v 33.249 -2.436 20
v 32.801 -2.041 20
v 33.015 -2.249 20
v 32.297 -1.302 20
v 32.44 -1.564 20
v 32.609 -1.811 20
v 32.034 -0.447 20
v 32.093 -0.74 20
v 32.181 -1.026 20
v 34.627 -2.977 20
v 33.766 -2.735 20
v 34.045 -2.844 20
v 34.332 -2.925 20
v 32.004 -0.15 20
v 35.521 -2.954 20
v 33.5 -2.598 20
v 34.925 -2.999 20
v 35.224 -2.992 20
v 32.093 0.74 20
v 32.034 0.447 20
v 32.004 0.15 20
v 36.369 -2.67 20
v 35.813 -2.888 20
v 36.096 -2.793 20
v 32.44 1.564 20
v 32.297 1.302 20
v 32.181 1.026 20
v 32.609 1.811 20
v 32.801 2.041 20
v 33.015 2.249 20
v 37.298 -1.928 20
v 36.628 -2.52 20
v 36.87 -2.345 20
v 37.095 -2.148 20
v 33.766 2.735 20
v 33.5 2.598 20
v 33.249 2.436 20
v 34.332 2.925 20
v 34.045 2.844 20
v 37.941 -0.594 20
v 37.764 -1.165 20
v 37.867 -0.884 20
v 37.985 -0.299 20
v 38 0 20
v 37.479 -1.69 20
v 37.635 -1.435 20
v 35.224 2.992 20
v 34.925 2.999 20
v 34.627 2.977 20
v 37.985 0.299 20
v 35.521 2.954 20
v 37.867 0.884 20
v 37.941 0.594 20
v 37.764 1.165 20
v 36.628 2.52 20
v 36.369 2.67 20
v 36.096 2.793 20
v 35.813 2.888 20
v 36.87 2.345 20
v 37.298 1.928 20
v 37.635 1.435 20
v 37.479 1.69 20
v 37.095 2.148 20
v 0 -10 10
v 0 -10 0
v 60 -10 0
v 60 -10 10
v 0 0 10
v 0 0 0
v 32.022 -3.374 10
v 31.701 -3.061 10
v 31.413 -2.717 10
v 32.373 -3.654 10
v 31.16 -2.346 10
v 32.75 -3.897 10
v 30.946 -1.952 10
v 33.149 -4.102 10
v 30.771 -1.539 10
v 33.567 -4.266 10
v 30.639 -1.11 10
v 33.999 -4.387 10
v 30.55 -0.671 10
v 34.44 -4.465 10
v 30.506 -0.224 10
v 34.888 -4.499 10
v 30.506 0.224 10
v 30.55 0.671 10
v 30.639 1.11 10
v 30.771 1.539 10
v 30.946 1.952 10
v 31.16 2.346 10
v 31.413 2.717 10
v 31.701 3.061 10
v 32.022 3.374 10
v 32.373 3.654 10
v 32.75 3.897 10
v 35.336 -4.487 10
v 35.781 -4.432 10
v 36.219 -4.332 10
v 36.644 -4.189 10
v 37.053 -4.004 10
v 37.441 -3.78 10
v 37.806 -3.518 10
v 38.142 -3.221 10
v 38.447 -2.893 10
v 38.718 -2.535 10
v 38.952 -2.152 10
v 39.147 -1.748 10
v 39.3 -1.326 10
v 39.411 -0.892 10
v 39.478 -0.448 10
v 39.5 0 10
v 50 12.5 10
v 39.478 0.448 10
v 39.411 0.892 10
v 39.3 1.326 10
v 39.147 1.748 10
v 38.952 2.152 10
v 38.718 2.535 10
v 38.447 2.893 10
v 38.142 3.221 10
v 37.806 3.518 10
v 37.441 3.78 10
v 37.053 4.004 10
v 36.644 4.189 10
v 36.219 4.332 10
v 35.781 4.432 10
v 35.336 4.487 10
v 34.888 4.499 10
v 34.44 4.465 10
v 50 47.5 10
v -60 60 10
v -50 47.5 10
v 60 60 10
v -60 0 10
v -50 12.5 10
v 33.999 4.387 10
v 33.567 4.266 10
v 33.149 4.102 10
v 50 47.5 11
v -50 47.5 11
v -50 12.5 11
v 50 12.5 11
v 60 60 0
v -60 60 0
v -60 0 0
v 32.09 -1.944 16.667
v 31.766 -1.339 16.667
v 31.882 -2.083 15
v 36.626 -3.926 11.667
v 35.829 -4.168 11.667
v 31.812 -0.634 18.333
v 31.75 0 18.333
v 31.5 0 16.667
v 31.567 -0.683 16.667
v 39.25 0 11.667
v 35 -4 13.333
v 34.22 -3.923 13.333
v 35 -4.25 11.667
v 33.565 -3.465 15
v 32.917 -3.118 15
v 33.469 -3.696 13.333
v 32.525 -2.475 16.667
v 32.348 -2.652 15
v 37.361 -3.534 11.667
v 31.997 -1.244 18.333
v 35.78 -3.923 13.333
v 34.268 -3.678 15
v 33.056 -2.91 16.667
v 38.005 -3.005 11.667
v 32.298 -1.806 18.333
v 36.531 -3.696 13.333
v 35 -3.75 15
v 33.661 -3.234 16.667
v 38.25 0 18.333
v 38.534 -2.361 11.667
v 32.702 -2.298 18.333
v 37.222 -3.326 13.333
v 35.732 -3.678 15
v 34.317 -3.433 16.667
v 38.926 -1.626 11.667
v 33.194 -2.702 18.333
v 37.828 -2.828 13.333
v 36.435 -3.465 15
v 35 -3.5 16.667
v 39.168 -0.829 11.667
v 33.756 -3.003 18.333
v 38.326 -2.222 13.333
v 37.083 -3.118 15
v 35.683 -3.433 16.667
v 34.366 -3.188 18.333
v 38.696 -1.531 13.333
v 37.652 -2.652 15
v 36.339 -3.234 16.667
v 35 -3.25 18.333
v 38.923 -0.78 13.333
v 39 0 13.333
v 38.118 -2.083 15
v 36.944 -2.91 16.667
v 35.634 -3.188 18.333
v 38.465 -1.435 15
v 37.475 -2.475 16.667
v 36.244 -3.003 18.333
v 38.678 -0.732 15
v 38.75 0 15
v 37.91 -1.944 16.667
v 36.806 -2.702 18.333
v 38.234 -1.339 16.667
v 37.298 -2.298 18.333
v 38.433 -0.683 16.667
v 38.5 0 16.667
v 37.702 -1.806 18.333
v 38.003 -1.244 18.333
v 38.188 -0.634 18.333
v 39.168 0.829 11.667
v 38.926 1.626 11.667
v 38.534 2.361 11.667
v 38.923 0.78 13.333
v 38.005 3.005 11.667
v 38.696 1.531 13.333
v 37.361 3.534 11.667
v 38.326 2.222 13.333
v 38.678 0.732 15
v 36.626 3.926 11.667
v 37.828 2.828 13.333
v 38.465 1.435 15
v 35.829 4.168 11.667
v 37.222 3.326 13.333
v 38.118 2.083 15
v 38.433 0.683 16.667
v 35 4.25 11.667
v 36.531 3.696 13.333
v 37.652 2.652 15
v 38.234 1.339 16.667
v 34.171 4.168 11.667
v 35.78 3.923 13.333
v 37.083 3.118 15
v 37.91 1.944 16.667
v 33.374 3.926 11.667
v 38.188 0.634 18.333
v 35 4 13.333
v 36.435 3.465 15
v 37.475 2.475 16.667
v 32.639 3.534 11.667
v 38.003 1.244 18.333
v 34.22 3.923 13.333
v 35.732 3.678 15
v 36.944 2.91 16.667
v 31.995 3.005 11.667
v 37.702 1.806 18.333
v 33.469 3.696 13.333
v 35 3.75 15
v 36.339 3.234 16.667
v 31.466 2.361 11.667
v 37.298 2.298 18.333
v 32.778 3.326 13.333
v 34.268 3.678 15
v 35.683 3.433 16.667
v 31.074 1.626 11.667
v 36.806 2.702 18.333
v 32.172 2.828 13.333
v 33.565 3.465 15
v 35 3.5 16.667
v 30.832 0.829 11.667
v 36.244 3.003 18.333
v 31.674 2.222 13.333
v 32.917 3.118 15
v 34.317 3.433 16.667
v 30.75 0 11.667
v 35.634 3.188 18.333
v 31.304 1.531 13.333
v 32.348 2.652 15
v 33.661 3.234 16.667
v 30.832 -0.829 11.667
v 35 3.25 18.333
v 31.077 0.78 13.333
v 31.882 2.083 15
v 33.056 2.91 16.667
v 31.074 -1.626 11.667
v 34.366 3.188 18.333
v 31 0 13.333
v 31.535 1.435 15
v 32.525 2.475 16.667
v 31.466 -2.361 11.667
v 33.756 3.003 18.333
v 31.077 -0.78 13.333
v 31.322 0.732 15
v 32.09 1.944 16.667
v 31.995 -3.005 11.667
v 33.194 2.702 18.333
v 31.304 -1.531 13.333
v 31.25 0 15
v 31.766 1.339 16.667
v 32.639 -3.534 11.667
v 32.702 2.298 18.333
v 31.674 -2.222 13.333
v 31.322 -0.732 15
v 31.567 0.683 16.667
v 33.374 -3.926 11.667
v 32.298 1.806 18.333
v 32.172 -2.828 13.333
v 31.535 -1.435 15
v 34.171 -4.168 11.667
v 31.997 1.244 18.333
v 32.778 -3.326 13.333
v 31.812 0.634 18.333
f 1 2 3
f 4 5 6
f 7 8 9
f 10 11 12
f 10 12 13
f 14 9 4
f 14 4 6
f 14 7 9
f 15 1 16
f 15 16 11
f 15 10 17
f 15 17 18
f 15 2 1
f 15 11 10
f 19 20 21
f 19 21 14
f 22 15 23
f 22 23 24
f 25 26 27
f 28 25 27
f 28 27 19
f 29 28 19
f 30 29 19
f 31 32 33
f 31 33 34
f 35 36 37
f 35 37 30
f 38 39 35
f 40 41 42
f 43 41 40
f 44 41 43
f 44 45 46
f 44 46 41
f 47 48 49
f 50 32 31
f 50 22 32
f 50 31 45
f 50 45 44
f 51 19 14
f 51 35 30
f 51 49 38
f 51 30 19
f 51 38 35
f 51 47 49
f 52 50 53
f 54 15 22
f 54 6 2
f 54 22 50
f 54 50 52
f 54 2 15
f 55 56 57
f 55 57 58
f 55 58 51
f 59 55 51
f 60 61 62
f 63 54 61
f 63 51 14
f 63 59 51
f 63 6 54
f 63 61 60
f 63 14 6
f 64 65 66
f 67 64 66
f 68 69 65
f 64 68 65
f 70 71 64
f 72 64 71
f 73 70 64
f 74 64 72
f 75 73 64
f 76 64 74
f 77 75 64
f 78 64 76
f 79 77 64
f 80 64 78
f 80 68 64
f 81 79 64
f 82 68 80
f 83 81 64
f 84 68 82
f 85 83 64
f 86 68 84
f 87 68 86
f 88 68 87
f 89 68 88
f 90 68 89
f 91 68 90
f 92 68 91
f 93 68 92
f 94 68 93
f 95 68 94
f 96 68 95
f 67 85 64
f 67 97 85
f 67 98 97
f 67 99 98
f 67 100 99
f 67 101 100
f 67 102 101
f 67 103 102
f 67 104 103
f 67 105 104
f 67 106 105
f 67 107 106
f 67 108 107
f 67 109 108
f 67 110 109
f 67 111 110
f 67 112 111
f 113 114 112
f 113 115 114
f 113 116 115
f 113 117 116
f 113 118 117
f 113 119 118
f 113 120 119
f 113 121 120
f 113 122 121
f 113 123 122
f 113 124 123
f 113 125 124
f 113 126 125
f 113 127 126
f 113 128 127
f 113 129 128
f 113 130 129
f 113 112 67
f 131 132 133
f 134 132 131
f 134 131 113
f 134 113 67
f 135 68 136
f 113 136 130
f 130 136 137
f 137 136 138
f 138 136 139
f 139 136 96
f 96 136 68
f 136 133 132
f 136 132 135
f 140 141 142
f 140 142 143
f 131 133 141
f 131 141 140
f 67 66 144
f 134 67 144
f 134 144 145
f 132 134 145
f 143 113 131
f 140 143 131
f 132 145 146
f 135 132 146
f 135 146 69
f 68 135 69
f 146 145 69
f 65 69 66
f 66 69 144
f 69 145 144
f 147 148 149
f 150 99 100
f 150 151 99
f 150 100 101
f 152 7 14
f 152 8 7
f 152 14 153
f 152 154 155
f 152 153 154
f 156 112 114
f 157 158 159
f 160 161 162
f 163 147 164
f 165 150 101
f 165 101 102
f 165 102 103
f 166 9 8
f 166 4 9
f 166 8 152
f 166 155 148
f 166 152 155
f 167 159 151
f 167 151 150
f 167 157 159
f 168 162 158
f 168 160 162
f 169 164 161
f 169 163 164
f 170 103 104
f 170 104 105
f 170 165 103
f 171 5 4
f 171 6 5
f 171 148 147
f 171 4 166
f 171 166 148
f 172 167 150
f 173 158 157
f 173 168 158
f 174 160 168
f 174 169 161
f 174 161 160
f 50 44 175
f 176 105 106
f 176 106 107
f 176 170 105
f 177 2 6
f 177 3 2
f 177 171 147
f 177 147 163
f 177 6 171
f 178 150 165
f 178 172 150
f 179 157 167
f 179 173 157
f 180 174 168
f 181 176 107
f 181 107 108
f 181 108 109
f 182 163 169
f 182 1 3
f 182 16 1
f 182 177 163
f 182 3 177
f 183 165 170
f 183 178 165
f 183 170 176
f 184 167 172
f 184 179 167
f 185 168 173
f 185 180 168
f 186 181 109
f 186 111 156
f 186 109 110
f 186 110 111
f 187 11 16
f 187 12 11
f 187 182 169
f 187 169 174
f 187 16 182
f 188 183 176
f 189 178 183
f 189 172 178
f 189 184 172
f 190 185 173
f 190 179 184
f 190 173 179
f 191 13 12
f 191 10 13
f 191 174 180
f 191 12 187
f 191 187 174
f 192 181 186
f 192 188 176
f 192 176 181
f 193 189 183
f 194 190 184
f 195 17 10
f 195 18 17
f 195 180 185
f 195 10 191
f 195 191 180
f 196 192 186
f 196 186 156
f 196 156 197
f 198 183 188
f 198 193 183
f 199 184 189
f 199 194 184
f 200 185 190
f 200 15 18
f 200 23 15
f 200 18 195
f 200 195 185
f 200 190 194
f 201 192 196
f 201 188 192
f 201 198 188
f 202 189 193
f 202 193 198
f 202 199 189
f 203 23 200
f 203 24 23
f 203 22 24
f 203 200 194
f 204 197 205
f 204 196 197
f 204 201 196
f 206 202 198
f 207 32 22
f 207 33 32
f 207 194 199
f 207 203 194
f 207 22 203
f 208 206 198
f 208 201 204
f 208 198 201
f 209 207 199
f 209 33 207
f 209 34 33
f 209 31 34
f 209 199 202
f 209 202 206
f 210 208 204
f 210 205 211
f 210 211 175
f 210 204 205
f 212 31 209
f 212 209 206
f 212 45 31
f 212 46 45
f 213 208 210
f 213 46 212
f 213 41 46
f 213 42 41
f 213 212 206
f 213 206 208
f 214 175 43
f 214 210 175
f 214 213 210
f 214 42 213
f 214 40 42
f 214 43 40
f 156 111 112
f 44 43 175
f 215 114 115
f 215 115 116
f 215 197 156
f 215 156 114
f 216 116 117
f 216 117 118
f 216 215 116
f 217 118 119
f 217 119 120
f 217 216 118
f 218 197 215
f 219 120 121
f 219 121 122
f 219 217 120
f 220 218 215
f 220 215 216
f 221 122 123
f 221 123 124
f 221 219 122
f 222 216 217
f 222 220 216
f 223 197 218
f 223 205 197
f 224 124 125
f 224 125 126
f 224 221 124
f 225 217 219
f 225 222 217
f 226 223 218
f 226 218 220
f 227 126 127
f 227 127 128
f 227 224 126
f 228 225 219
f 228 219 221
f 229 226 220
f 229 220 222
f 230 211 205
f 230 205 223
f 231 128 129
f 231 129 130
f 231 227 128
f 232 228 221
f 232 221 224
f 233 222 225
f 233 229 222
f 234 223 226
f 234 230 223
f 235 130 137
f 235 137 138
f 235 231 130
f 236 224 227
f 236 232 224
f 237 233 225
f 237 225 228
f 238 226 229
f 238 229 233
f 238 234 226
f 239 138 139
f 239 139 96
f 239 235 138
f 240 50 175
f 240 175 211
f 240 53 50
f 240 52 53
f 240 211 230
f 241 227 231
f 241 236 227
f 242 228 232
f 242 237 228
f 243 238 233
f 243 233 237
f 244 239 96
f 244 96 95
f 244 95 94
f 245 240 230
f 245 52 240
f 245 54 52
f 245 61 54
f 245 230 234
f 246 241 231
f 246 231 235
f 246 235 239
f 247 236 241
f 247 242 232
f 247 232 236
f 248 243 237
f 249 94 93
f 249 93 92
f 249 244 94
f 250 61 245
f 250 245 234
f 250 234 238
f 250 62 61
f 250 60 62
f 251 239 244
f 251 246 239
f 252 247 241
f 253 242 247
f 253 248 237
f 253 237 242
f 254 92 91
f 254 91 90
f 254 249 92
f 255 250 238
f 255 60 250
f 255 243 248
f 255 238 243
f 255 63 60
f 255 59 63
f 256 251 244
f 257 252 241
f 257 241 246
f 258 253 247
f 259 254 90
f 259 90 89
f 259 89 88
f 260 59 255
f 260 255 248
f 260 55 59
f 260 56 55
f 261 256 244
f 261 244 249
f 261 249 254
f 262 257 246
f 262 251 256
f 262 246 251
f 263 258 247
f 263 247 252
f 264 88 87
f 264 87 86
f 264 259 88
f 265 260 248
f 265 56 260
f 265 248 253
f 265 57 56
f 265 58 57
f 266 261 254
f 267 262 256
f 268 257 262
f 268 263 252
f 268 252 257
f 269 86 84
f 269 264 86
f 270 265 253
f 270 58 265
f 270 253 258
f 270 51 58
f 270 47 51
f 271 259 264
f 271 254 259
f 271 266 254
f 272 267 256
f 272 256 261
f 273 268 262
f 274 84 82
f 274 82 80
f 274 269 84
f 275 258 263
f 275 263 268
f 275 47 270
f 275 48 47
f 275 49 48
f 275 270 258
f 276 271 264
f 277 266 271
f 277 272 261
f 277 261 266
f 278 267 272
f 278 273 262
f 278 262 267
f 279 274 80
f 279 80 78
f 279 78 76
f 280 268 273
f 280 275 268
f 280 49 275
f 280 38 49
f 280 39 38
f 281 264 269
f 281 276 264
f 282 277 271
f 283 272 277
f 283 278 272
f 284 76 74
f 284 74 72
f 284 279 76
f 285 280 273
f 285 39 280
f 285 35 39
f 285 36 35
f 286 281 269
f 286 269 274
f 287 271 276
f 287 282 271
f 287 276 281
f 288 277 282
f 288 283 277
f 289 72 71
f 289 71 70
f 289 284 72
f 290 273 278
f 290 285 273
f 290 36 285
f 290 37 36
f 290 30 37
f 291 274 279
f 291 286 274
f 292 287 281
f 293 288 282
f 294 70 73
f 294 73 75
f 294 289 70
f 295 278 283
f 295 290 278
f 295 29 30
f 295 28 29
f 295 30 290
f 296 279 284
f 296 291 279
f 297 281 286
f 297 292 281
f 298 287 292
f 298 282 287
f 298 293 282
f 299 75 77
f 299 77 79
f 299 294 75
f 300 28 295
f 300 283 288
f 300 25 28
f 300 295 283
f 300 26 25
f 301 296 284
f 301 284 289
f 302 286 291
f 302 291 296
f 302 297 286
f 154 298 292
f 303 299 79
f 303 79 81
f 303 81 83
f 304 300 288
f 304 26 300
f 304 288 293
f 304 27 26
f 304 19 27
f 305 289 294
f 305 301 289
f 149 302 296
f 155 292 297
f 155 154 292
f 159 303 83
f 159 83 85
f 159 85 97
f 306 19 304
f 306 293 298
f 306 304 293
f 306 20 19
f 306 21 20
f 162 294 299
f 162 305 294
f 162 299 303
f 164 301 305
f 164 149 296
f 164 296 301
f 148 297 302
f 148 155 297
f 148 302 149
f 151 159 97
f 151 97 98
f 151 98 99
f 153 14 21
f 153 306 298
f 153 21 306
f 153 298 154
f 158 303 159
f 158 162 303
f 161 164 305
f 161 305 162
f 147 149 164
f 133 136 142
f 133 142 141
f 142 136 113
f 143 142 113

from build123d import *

# Parameters (mm, degrees)
ESTRUSIONE_ESTRUSIONE1_DEPTH = 10
SCHIZZO2_W                   = 100
SCHIZZO2_H                   = 35
ESTRUSIONE_ESTRUSIONE2_DEPTH = 1
SCHIZZO3_R                   = 4.5
SCHIZZO4_R                   = 3


with BuildPart() as part:
    # Schizzo1 → Estrusione-Estrusione1 (new body)
    with BuildSketch(Plane.XY):
        Polygon((-60, 60), (-60, 0), (0, 0), (0, -10), (60, -10), (60, 0.1203125), (60, 60), align=None)
    extrude(amount=ESTRUSIONE_ESTRUSIONE1_DEPTH)

    # Schizzo2 → Estrusione-Estrusione2 (add)
    with BuildSketch(Plane.XY.offset(10)):
        with Locations((0, 30)):
            Rectangle(SCHIZZO2_W, SCHIZZO2_H)
    extrude(amount=ESTRUSIONE_ESTRUSIONE2_DEPTH)

    # Schizzo3 → Loft1 section 0
    with BuildSketch(Plane.XY.offset(10)):
        with Locations((35, 0)):
            Circle(SCHIZZO3_R)
    # Schizzo4 → Loft1 section 1
    with BuildSketch(Plane.XY.offset(20)):
        with Locations((35, 0)):
            Circle(SCHIZZO4_R)
    loft()


solid = part.part
